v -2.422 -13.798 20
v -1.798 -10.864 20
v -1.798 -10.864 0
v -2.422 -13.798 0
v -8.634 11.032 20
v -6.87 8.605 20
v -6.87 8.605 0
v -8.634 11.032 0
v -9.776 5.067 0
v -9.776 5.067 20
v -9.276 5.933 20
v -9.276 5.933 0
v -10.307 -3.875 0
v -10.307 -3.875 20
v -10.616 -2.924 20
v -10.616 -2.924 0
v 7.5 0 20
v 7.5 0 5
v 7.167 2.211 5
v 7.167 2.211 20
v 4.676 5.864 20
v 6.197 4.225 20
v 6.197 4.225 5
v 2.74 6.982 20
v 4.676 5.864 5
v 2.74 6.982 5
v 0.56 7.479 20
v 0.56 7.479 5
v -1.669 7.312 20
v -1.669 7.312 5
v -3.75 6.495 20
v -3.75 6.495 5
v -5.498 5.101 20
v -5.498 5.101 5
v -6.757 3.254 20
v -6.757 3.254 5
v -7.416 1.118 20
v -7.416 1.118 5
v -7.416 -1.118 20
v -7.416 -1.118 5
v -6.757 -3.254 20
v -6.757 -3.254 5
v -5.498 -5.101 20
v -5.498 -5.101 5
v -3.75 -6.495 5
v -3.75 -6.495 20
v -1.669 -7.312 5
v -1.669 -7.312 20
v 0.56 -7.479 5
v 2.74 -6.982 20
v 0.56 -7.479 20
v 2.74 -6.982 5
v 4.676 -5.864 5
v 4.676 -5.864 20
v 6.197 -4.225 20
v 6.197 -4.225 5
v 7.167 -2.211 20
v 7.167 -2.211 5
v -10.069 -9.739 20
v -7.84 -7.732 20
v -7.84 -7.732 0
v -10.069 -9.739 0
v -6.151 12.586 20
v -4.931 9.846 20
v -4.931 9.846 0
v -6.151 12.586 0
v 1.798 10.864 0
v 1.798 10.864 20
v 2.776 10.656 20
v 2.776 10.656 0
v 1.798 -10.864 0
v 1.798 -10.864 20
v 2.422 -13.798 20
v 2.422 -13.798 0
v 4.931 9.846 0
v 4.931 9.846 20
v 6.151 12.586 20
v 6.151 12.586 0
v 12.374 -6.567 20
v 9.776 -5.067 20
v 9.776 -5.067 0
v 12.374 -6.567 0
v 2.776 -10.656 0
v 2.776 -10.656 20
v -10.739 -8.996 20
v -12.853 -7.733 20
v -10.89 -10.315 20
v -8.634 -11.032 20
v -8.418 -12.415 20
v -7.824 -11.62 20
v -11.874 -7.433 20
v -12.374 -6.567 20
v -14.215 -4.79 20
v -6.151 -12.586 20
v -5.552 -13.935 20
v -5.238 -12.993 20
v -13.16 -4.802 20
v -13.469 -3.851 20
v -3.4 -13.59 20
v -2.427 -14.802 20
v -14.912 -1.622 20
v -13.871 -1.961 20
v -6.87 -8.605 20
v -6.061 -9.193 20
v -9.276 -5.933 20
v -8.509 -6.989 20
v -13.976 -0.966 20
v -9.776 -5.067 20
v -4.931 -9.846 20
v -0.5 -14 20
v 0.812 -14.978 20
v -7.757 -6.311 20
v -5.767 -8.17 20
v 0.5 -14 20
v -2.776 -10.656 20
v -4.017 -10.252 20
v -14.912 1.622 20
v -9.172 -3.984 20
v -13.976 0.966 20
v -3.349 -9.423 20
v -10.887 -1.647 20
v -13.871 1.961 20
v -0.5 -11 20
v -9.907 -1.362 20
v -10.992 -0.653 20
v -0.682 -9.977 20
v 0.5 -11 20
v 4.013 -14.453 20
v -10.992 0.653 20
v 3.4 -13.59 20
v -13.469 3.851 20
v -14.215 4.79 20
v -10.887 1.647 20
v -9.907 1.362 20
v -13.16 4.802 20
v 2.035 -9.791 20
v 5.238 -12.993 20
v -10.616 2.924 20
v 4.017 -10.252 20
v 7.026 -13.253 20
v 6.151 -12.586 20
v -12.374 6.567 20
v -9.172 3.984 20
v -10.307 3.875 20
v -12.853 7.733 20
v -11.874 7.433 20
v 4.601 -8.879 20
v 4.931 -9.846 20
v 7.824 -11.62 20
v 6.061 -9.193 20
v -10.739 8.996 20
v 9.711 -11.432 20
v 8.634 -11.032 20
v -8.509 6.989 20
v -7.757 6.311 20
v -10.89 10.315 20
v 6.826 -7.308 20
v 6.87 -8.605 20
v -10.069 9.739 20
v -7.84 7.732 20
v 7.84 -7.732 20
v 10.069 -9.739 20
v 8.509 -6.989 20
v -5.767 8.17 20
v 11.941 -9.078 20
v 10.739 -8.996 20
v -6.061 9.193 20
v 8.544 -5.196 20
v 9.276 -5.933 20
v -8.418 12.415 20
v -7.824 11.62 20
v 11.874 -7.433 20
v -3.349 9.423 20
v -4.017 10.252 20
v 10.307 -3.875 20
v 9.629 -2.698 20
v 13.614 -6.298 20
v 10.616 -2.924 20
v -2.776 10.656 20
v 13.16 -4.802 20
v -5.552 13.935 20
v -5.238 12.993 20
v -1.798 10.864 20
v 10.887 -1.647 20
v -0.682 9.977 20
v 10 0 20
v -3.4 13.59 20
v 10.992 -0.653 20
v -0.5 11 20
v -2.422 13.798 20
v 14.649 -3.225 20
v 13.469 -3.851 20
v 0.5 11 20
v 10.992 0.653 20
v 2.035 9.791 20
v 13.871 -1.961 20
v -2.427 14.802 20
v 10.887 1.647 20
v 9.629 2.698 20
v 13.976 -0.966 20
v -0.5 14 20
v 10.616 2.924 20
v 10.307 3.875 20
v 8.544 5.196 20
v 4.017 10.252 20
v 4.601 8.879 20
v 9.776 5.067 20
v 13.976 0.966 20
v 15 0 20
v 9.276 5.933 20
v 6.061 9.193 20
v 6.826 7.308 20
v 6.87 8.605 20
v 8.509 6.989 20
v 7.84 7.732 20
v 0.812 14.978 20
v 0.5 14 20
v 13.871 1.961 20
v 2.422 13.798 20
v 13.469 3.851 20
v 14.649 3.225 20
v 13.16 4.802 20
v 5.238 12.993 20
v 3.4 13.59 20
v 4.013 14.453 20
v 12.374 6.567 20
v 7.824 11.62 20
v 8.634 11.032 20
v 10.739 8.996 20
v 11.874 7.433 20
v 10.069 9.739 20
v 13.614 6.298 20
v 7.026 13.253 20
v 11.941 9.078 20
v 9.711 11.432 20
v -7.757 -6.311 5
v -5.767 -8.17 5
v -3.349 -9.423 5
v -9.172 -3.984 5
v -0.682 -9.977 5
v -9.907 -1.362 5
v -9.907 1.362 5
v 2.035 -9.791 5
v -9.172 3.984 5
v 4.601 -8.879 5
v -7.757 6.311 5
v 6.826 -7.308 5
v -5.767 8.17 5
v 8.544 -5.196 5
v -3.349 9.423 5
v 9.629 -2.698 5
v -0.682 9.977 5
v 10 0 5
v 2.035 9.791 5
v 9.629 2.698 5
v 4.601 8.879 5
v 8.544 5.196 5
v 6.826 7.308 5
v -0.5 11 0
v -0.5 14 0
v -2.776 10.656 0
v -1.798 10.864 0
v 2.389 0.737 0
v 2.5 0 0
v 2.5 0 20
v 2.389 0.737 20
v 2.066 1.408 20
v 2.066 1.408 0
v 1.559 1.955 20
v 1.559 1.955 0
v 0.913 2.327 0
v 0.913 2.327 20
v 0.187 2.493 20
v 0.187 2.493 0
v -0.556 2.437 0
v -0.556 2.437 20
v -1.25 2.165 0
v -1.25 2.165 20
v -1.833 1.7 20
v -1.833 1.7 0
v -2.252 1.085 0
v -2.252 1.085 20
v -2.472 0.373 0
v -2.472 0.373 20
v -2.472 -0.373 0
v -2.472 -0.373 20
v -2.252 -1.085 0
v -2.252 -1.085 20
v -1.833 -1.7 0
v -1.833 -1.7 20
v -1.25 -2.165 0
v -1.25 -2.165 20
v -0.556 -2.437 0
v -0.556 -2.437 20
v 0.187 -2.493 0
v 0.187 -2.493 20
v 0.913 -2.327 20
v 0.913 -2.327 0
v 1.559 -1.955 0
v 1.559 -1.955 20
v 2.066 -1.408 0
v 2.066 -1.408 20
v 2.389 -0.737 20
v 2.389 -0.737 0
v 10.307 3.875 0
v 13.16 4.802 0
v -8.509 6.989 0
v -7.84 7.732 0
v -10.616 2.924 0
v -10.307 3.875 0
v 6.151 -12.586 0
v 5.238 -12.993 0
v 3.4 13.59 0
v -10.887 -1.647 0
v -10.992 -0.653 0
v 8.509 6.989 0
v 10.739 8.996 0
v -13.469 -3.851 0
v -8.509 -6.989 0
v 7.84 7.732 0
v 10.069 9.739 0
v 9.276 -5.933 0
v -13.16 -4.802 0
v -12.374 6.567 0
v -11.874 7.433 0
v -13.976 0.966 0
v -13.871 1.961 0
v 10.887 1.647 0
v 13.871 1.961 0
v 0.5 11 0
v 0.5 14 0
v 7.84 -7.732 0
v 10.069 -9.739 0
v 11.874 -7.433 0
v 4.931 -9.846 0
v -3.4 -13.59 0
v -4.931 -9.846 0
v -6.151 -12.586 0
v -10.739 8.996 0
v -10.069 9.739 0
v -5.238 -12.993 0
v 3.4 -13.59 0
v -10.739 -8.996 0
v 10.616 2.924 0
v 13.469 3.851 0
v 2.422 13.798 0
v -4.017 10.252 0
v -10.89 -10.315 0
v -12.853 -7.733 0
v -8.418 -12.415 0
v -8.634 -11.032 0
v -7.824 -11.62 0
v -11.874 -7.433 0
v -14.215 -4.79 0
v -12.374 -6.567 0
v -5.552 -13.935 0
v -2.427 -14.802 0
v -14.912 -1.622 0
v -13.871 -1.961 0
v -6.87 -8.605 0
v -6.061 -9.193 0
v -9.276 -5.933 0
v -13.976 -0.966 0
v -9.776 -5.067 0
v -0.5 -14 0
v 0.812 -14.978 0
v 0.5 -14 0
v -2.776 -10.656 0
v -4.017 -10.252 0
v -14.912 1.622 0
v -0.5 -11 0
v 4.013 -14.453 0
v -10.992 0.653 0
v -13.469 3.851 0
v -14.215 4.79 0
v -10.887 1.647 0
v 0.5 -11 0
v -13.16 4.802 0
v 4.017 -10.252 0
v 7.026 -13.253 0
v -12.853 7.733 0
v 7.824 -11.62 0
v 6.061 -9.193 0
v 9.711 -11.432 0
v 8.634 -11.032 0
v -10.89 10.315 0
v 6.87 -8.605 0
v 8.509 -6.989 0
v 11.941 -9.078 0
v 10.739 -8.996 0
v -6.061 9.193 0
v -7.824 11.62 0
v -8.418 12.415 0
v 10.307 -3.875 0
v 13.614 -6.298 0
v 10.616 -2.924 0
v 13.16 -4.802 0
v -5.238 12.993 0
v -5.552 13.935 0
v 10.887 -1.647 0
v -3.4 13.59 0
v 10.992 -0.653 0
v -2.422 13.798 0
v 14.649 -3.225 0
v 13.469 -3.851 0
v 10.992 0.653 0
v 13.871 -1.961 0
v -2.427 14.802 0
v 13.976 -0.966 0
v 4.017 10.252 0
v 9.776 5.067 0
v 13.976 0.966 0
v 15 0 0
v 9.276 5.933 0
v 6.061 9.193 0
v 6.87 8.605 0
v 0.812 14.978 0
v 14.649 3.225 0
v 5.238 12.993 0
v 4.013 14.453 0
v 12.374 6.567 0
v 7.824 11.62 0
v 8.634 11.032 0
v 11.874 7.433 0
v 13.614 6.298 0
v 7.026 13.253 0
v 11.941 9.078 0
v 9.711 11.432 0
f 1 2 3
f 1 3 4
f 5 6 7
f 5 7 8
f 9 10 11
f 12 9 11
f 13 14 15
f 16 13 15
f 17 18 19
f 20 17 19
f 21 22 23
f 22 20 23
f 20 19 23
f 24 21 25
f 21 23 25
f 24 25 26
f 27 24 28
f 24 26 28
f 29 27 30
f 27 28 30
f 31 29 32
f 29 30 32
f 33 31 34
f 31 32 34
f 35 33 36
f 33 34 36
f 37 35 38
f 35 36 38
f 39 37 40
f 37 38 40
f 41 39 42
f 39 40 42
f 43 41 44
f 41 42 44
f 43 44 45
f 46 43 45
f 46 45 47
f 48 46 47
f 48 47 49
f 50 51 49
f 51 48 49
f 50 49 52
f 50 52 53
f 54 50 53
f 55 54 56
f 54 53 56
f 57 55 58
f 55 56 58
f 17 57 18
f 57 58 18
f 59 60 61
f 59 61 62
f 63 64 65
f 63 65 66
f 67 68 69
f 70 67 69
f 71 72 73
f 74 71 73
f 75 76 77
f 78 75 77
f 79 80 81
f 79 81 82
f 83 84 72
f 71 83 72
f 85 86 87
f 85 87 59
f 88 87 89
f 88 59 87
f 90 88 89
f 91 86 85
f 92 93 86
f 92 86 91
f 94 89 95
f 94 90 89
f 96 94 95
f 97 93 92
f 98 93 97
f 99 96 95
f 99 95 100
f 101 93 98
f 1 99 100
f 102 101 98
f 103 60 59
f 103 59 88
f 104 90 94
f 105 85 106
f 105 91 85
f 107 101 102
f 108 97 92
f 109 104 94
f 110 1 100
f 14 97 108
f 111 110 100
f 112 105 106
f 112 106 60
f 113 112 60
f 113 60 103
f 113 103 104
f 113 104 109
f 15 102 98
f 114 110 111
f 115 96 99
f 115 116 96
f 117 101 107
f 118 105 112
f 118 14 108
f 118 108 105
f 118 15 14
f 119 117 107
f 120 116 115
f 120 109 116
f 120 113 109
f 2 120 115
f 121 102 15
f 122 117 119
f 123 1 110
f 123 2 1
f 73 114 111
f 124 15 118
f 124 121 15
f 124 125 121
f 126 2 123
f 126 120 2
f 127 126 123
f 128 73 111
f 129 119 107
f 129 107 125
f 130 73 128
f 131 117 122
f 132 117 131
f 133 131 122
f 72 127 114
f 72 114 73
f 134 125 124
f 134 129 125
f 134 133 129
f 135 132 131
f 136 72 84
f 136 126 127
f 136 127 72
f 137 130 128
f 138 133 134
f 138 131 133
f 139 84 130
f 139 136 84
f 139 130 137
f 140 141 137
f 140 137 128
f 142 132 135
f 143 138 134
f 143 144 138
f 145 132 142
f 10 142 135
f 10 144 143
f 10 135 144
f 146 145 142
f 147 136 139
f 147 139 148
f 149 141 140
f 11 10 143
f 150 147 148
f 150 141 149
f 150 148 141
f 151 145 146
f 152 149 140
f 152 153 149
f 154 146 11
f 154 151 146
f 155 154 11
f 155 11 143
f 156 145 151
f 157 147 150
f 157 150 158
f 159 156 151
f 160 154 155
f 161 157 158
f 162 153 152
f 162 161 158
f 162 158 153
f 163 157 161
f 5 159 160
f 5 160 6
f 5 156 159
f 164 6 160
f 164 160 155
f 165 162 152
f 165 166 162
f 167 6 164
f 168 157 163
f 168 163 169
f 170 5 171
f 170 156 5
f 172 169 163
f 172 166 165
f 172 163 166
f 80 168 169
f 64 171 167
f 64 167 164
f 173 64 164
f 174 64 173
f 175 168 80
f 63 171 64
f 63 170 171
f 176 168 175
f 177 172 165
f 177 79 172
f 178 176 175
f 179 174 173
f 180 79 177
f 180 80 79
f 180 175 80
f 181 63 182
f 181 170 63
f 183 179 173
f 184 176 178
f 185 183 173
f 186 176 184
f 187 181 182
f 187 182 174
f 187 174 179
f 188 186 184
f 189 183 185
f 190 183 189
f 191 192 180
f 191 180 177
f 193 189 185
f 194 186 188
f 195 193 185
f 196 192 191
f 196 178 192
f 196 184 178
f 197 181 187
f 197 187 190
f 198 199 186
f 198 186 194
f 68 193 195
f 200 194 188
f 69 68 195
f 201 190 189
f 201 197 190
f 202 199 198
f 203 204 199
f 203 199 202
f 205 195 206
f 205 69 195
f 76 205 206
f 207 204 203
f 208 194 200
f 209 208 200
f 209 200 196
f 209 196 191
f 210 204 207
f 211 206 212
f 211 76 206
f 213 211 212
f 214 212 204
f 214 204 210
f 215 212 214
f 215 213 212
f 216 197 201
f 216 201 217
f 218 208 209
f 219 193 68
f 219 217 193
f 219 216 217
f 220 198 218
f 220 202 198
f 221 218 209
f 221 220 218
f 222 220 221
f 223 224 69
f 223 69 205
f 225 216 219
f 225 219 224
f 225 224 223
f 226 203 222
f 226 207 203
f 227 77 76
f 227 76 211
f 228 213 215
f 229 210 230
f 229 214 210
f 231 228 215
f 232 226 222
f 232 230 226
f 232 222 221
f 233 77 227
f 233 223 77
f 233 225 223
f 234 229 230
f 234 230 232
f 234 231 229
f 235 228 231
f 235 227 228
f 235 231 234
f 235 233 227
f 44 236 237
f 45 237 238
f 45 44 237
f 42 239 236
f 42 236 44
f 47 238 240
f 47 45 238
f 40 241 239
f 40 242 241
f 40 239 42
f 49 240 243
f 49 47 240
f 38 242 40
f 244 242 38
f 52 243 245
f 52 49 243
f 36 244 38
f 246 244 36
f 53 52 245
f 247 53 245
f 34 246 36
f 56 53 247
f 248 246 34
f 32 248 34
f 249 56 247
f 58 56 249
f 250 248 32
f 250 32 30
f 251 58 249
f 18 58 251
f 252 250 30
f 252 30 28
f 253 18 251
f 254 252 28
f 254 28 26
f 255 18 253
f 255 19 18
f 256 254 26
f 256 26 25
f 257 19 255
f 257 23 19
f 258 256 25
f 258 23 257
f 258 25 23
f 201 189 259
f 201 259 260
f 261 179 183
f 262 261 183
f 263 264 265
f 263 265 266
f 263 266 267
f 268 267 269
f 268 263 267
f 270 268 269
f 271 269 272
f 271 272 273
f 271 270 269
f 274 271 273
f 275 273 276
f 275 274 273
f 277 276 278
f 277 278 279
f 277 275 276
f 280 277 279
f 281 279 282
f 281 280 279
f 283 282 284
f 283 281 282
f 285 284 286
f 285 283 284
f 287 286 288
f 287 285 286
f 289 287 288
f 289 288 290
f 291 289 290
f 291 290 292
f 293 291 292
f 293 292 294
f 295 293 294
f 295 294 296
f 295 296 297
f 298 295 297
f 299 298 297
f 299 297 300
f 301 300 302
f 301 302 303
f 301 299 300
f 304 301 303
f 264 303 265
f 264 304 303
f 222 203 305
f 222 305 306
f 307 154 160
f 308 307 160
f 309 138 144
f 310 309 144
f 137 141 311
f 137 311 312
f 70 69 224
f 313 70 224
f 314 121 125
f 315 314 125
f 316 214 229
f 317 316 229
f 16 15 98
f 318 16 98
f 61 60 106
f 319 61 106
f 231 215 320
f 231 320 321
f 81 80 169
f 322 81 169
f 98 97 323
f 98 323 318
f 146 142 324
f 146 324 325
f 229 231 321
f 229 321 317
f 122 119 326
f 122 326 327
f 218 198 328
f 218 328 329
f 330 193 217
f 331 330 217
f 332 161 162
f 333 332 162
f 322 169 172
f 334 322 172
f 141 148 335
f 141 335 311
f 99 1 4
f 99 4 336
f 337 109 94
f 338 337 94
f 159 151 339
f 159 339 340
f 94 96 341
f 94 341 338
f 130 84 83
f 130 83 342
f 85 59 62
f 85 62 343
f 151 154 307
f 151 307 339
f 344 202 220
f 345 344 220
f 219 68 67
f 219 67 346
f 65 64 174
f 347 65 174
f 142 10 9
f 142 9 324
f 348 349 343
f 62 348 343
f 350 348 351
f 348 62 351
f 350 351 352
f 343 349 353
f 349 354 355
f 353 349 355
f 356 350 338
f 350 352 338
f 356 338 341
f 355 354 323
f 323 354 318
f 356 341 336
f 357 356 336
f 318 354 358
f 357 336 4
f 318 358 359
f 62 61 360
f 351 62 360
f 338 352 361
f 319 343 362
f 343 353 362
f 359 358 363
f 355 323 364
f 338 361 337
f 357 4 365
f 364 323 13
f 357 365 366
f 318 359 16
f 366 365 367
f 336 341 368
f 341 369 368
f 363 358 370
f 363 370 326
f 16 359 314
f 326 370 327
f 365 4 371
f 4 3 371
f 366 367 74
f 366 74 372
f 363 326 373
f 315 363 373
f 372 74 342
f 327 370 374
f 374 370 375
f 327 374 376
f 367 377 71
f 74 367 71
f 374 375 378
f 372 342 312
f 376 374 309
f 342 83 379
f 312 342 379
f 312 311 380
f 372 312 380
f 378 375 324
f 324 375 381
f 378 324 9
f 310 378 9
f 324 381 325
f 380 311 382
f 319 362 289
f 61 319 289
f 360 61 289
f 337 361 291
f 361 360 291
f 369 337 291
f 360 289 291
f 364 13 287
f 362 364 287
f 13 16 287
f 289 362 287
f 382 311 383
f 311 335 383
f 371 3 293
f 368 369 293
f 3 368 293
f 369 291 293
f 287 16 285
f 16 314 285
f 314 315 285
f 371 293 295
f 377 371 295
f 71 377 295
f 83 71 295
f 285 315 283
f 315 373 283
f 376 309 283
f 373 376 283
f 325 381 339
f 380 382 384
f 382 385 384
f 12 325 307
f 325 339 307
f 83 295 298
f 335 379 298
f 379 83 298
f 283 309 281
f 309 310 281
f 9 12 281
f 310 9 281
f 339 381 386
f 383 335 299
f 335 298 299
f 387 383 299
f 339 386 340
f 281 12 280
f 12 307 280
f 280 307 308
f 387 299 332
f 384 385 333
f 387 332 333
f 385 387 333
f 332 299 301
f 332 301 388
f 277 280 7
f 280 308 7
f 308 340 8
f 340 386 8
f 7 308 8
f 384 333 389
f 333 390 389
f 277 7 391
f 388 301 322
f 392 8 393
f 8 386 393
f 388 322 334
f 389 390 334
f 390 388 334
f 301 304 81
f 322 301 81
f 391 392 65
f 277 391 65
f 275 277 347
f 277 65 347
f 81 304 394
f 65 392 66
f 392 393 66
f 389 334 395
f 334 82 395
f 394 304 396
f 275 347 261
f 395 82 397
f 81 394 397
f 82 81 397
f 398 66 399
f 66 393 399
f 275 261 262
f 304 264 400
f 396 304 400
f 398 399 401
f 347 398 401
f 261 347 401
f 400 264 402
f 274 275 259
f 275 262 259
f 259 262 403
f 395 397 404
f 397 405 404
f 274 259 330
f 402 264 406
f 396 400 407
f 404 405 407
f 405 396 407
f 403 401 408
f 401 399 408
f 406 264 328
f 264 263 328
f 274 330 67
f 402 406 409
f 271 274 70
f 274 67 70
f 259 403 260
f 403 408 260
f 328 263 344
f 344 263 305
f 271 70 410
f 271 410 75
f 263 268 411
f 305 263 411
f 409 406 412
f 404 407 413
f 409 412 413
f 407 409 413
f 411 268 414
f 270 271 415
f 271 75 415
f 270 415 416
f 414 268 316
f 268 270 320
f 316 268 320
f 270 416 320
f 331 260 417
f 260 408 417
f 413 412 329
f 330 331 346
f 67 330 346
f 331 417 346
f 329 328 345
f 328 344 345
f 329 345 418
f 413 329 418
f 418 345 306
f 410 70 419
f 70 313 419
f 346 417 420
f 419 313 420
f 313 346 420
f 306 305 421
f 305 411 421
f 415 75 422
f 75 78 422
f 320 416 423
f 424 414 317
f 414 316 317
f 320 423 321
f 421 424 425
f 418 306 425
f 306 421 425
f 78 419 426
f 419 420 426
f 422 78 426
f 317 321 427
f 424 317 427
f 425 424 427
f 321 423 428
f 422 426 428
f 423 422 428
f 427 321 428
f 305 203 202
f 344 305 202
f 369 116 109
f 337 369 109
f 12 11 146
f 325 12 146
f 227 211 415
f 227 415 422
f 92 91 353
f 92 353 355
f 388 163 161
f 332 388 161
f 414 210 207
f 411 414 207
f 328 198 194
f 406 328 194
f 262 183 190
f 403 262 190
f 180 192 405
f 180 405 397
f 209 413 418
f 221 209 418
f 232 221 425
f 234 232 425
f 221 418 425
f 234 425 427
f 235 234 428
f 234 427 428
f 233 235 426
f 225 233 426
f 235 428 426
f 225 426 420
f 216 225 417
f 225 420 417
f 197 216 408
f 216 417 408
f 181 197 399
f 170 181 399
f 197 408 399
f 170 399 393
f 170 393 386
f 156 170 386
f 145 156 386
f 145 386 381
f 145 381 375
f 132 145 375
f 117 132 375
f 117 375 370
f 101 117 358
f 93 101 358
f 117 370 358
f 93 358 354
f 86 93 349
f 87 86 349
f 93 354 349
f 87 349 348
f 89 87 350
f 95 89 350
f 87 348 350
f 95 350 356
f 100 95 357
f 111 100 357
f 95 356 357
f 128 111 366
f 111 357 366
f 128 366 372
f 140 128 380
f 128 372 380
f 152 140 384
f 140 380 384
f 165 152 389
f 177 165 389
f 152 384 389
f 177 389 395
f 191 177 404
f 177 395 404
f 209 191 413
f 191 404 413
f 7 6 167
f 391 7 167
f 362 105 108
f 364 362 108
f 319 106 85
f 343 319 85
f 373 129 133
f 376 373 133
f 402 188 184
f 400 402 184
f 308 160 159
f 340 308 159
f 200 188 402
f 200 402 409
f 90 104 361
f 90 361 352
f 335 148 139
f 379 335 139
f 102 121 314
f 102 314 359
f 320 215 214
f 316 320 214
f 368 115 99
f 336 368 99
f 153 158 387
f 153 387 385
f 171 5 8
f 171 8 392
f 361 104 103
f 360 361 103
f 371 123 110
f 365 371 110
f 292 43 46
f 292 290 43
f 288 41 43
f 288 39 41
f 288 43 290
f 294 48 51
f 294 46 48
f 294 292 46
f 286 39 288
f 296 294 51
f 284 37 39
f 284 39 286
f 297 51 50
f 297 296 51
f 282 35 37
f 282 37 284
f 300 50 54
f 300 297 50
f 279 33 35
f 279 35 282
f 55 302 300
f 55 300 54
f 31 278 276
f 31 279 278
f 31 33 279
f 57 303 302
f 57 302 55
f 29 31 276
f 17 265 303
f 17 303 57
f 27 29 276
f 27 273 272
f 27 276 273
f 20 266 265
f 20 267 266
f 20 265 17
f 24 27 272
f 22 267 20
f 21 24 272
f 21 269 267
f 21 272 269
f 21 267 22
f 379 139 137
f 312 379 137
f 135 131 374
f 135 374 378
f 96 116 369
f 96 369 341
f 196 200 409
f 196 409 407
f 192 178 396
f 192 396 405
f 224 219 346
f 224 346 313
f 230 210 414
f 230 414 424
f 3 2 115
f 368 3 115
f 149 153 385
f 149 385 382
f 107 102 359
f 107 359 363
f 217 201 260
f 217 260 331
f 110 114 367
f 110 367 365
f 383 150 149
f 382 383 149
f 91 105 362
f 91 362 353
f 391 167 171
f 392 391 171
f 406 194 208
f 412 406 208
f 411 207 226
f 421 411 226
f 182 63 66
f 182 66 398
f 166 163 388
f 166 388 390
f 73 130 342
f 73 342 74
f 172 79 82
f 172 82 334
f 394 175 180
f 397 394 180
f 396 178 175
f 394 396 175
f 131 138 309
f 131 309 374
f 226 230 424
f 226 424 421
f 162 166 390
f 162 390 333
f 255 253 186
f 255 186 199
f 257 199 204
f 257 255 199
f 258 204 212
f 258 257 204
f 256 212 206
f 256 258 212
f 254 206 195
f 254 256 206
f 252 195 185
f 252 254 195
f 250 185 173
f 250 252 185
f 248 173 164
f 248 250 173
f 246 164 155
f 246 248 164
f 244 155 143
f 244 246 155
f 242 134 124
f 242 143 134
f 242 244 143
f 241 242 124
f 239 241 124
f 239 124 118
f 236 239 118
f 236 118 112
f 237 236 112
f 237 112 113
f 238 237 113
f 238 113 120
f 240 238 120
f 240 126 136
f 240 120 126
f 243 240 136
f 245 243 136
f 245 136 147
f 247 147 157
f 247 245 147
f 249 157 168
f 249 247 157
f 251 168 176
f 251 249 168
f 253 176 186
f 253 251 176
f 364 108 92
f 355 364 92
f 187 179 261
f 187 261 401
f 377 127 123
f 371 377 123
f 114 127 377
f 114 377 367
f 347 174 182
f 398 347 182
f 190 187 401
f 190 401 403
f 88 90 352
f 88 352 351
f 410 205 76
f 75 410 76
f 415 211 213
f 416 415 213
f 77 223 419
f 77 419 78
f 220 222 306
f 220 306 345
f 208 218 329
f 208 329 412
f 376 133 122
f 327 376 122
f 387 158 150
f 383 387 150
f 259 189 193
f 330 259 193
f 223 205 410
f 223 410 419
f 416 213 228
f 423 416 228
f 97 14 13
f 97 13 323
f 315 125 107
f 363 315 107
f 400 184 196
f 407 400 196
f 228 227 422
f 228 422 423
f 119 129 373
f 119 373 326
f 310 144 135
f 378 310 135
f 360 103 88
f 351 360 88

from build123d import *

# Parameters (mm, degrees)
SKETCH1_R               = 15
SKETCH1_R_2             = 2.5
BOSS_EXTRUDE1_DEPTH     = 20
SHELL1_T                = -5
SKETCH2_W               = 1
SKETCH2_H               = 3
CUT_EXTRUDE_THIN1_DEPTH = 30.154759474
CIRPATTERN1_COUNT       = 30


with BuildPart() as part:
    # Sketch1 → Boss-Extrude1 (new body)
    with BuildSketch(Plane.XY):
        Circle(SKETCH1_R)
        Circle(SKETCH1_R_2, mode=Mode.SUBTRACT)
    extrude(amount=BOSS_EXTRUDE1_DEPTH)

    # Shell1
    shell1_openings = [part.faces().sort_by_distance(p)[0] for p in [
        (-14.575735931, 0, 20),
    ]]
    offset(amount=SHELL1_T, openings=shell1_openings, kind=Kind.INTERSECTION)

    # Sketch2 → Cut-Extrude-Thin1 (cut, symmetric)
    with BuildSketch(Plane.XY):
        with Locations((0, 12.5)):
            Rectangle(SKETCH2_W, SKETCH2_H)
    cut_extrude_thin1 = extrude(amount=CUT_EXTRUDE_THIN1_DEPTH, both=True, mode=Mode.SUBTRACT)

    # CirPattern1: Cut-Extrude-Thin1 ×30 about axis
    cirpattern1_axis = Axis((0, 0, 0), (0, 0, 1))
    for i in range(1, CIRPATTERN1_COUNT):
        add(cut_extrude_thin1.rotate(cirpattern1_axis, i * 360 / CIRPATTERN1_COUNT), mode=Mode.SUBTRACT)


solid = part.part
